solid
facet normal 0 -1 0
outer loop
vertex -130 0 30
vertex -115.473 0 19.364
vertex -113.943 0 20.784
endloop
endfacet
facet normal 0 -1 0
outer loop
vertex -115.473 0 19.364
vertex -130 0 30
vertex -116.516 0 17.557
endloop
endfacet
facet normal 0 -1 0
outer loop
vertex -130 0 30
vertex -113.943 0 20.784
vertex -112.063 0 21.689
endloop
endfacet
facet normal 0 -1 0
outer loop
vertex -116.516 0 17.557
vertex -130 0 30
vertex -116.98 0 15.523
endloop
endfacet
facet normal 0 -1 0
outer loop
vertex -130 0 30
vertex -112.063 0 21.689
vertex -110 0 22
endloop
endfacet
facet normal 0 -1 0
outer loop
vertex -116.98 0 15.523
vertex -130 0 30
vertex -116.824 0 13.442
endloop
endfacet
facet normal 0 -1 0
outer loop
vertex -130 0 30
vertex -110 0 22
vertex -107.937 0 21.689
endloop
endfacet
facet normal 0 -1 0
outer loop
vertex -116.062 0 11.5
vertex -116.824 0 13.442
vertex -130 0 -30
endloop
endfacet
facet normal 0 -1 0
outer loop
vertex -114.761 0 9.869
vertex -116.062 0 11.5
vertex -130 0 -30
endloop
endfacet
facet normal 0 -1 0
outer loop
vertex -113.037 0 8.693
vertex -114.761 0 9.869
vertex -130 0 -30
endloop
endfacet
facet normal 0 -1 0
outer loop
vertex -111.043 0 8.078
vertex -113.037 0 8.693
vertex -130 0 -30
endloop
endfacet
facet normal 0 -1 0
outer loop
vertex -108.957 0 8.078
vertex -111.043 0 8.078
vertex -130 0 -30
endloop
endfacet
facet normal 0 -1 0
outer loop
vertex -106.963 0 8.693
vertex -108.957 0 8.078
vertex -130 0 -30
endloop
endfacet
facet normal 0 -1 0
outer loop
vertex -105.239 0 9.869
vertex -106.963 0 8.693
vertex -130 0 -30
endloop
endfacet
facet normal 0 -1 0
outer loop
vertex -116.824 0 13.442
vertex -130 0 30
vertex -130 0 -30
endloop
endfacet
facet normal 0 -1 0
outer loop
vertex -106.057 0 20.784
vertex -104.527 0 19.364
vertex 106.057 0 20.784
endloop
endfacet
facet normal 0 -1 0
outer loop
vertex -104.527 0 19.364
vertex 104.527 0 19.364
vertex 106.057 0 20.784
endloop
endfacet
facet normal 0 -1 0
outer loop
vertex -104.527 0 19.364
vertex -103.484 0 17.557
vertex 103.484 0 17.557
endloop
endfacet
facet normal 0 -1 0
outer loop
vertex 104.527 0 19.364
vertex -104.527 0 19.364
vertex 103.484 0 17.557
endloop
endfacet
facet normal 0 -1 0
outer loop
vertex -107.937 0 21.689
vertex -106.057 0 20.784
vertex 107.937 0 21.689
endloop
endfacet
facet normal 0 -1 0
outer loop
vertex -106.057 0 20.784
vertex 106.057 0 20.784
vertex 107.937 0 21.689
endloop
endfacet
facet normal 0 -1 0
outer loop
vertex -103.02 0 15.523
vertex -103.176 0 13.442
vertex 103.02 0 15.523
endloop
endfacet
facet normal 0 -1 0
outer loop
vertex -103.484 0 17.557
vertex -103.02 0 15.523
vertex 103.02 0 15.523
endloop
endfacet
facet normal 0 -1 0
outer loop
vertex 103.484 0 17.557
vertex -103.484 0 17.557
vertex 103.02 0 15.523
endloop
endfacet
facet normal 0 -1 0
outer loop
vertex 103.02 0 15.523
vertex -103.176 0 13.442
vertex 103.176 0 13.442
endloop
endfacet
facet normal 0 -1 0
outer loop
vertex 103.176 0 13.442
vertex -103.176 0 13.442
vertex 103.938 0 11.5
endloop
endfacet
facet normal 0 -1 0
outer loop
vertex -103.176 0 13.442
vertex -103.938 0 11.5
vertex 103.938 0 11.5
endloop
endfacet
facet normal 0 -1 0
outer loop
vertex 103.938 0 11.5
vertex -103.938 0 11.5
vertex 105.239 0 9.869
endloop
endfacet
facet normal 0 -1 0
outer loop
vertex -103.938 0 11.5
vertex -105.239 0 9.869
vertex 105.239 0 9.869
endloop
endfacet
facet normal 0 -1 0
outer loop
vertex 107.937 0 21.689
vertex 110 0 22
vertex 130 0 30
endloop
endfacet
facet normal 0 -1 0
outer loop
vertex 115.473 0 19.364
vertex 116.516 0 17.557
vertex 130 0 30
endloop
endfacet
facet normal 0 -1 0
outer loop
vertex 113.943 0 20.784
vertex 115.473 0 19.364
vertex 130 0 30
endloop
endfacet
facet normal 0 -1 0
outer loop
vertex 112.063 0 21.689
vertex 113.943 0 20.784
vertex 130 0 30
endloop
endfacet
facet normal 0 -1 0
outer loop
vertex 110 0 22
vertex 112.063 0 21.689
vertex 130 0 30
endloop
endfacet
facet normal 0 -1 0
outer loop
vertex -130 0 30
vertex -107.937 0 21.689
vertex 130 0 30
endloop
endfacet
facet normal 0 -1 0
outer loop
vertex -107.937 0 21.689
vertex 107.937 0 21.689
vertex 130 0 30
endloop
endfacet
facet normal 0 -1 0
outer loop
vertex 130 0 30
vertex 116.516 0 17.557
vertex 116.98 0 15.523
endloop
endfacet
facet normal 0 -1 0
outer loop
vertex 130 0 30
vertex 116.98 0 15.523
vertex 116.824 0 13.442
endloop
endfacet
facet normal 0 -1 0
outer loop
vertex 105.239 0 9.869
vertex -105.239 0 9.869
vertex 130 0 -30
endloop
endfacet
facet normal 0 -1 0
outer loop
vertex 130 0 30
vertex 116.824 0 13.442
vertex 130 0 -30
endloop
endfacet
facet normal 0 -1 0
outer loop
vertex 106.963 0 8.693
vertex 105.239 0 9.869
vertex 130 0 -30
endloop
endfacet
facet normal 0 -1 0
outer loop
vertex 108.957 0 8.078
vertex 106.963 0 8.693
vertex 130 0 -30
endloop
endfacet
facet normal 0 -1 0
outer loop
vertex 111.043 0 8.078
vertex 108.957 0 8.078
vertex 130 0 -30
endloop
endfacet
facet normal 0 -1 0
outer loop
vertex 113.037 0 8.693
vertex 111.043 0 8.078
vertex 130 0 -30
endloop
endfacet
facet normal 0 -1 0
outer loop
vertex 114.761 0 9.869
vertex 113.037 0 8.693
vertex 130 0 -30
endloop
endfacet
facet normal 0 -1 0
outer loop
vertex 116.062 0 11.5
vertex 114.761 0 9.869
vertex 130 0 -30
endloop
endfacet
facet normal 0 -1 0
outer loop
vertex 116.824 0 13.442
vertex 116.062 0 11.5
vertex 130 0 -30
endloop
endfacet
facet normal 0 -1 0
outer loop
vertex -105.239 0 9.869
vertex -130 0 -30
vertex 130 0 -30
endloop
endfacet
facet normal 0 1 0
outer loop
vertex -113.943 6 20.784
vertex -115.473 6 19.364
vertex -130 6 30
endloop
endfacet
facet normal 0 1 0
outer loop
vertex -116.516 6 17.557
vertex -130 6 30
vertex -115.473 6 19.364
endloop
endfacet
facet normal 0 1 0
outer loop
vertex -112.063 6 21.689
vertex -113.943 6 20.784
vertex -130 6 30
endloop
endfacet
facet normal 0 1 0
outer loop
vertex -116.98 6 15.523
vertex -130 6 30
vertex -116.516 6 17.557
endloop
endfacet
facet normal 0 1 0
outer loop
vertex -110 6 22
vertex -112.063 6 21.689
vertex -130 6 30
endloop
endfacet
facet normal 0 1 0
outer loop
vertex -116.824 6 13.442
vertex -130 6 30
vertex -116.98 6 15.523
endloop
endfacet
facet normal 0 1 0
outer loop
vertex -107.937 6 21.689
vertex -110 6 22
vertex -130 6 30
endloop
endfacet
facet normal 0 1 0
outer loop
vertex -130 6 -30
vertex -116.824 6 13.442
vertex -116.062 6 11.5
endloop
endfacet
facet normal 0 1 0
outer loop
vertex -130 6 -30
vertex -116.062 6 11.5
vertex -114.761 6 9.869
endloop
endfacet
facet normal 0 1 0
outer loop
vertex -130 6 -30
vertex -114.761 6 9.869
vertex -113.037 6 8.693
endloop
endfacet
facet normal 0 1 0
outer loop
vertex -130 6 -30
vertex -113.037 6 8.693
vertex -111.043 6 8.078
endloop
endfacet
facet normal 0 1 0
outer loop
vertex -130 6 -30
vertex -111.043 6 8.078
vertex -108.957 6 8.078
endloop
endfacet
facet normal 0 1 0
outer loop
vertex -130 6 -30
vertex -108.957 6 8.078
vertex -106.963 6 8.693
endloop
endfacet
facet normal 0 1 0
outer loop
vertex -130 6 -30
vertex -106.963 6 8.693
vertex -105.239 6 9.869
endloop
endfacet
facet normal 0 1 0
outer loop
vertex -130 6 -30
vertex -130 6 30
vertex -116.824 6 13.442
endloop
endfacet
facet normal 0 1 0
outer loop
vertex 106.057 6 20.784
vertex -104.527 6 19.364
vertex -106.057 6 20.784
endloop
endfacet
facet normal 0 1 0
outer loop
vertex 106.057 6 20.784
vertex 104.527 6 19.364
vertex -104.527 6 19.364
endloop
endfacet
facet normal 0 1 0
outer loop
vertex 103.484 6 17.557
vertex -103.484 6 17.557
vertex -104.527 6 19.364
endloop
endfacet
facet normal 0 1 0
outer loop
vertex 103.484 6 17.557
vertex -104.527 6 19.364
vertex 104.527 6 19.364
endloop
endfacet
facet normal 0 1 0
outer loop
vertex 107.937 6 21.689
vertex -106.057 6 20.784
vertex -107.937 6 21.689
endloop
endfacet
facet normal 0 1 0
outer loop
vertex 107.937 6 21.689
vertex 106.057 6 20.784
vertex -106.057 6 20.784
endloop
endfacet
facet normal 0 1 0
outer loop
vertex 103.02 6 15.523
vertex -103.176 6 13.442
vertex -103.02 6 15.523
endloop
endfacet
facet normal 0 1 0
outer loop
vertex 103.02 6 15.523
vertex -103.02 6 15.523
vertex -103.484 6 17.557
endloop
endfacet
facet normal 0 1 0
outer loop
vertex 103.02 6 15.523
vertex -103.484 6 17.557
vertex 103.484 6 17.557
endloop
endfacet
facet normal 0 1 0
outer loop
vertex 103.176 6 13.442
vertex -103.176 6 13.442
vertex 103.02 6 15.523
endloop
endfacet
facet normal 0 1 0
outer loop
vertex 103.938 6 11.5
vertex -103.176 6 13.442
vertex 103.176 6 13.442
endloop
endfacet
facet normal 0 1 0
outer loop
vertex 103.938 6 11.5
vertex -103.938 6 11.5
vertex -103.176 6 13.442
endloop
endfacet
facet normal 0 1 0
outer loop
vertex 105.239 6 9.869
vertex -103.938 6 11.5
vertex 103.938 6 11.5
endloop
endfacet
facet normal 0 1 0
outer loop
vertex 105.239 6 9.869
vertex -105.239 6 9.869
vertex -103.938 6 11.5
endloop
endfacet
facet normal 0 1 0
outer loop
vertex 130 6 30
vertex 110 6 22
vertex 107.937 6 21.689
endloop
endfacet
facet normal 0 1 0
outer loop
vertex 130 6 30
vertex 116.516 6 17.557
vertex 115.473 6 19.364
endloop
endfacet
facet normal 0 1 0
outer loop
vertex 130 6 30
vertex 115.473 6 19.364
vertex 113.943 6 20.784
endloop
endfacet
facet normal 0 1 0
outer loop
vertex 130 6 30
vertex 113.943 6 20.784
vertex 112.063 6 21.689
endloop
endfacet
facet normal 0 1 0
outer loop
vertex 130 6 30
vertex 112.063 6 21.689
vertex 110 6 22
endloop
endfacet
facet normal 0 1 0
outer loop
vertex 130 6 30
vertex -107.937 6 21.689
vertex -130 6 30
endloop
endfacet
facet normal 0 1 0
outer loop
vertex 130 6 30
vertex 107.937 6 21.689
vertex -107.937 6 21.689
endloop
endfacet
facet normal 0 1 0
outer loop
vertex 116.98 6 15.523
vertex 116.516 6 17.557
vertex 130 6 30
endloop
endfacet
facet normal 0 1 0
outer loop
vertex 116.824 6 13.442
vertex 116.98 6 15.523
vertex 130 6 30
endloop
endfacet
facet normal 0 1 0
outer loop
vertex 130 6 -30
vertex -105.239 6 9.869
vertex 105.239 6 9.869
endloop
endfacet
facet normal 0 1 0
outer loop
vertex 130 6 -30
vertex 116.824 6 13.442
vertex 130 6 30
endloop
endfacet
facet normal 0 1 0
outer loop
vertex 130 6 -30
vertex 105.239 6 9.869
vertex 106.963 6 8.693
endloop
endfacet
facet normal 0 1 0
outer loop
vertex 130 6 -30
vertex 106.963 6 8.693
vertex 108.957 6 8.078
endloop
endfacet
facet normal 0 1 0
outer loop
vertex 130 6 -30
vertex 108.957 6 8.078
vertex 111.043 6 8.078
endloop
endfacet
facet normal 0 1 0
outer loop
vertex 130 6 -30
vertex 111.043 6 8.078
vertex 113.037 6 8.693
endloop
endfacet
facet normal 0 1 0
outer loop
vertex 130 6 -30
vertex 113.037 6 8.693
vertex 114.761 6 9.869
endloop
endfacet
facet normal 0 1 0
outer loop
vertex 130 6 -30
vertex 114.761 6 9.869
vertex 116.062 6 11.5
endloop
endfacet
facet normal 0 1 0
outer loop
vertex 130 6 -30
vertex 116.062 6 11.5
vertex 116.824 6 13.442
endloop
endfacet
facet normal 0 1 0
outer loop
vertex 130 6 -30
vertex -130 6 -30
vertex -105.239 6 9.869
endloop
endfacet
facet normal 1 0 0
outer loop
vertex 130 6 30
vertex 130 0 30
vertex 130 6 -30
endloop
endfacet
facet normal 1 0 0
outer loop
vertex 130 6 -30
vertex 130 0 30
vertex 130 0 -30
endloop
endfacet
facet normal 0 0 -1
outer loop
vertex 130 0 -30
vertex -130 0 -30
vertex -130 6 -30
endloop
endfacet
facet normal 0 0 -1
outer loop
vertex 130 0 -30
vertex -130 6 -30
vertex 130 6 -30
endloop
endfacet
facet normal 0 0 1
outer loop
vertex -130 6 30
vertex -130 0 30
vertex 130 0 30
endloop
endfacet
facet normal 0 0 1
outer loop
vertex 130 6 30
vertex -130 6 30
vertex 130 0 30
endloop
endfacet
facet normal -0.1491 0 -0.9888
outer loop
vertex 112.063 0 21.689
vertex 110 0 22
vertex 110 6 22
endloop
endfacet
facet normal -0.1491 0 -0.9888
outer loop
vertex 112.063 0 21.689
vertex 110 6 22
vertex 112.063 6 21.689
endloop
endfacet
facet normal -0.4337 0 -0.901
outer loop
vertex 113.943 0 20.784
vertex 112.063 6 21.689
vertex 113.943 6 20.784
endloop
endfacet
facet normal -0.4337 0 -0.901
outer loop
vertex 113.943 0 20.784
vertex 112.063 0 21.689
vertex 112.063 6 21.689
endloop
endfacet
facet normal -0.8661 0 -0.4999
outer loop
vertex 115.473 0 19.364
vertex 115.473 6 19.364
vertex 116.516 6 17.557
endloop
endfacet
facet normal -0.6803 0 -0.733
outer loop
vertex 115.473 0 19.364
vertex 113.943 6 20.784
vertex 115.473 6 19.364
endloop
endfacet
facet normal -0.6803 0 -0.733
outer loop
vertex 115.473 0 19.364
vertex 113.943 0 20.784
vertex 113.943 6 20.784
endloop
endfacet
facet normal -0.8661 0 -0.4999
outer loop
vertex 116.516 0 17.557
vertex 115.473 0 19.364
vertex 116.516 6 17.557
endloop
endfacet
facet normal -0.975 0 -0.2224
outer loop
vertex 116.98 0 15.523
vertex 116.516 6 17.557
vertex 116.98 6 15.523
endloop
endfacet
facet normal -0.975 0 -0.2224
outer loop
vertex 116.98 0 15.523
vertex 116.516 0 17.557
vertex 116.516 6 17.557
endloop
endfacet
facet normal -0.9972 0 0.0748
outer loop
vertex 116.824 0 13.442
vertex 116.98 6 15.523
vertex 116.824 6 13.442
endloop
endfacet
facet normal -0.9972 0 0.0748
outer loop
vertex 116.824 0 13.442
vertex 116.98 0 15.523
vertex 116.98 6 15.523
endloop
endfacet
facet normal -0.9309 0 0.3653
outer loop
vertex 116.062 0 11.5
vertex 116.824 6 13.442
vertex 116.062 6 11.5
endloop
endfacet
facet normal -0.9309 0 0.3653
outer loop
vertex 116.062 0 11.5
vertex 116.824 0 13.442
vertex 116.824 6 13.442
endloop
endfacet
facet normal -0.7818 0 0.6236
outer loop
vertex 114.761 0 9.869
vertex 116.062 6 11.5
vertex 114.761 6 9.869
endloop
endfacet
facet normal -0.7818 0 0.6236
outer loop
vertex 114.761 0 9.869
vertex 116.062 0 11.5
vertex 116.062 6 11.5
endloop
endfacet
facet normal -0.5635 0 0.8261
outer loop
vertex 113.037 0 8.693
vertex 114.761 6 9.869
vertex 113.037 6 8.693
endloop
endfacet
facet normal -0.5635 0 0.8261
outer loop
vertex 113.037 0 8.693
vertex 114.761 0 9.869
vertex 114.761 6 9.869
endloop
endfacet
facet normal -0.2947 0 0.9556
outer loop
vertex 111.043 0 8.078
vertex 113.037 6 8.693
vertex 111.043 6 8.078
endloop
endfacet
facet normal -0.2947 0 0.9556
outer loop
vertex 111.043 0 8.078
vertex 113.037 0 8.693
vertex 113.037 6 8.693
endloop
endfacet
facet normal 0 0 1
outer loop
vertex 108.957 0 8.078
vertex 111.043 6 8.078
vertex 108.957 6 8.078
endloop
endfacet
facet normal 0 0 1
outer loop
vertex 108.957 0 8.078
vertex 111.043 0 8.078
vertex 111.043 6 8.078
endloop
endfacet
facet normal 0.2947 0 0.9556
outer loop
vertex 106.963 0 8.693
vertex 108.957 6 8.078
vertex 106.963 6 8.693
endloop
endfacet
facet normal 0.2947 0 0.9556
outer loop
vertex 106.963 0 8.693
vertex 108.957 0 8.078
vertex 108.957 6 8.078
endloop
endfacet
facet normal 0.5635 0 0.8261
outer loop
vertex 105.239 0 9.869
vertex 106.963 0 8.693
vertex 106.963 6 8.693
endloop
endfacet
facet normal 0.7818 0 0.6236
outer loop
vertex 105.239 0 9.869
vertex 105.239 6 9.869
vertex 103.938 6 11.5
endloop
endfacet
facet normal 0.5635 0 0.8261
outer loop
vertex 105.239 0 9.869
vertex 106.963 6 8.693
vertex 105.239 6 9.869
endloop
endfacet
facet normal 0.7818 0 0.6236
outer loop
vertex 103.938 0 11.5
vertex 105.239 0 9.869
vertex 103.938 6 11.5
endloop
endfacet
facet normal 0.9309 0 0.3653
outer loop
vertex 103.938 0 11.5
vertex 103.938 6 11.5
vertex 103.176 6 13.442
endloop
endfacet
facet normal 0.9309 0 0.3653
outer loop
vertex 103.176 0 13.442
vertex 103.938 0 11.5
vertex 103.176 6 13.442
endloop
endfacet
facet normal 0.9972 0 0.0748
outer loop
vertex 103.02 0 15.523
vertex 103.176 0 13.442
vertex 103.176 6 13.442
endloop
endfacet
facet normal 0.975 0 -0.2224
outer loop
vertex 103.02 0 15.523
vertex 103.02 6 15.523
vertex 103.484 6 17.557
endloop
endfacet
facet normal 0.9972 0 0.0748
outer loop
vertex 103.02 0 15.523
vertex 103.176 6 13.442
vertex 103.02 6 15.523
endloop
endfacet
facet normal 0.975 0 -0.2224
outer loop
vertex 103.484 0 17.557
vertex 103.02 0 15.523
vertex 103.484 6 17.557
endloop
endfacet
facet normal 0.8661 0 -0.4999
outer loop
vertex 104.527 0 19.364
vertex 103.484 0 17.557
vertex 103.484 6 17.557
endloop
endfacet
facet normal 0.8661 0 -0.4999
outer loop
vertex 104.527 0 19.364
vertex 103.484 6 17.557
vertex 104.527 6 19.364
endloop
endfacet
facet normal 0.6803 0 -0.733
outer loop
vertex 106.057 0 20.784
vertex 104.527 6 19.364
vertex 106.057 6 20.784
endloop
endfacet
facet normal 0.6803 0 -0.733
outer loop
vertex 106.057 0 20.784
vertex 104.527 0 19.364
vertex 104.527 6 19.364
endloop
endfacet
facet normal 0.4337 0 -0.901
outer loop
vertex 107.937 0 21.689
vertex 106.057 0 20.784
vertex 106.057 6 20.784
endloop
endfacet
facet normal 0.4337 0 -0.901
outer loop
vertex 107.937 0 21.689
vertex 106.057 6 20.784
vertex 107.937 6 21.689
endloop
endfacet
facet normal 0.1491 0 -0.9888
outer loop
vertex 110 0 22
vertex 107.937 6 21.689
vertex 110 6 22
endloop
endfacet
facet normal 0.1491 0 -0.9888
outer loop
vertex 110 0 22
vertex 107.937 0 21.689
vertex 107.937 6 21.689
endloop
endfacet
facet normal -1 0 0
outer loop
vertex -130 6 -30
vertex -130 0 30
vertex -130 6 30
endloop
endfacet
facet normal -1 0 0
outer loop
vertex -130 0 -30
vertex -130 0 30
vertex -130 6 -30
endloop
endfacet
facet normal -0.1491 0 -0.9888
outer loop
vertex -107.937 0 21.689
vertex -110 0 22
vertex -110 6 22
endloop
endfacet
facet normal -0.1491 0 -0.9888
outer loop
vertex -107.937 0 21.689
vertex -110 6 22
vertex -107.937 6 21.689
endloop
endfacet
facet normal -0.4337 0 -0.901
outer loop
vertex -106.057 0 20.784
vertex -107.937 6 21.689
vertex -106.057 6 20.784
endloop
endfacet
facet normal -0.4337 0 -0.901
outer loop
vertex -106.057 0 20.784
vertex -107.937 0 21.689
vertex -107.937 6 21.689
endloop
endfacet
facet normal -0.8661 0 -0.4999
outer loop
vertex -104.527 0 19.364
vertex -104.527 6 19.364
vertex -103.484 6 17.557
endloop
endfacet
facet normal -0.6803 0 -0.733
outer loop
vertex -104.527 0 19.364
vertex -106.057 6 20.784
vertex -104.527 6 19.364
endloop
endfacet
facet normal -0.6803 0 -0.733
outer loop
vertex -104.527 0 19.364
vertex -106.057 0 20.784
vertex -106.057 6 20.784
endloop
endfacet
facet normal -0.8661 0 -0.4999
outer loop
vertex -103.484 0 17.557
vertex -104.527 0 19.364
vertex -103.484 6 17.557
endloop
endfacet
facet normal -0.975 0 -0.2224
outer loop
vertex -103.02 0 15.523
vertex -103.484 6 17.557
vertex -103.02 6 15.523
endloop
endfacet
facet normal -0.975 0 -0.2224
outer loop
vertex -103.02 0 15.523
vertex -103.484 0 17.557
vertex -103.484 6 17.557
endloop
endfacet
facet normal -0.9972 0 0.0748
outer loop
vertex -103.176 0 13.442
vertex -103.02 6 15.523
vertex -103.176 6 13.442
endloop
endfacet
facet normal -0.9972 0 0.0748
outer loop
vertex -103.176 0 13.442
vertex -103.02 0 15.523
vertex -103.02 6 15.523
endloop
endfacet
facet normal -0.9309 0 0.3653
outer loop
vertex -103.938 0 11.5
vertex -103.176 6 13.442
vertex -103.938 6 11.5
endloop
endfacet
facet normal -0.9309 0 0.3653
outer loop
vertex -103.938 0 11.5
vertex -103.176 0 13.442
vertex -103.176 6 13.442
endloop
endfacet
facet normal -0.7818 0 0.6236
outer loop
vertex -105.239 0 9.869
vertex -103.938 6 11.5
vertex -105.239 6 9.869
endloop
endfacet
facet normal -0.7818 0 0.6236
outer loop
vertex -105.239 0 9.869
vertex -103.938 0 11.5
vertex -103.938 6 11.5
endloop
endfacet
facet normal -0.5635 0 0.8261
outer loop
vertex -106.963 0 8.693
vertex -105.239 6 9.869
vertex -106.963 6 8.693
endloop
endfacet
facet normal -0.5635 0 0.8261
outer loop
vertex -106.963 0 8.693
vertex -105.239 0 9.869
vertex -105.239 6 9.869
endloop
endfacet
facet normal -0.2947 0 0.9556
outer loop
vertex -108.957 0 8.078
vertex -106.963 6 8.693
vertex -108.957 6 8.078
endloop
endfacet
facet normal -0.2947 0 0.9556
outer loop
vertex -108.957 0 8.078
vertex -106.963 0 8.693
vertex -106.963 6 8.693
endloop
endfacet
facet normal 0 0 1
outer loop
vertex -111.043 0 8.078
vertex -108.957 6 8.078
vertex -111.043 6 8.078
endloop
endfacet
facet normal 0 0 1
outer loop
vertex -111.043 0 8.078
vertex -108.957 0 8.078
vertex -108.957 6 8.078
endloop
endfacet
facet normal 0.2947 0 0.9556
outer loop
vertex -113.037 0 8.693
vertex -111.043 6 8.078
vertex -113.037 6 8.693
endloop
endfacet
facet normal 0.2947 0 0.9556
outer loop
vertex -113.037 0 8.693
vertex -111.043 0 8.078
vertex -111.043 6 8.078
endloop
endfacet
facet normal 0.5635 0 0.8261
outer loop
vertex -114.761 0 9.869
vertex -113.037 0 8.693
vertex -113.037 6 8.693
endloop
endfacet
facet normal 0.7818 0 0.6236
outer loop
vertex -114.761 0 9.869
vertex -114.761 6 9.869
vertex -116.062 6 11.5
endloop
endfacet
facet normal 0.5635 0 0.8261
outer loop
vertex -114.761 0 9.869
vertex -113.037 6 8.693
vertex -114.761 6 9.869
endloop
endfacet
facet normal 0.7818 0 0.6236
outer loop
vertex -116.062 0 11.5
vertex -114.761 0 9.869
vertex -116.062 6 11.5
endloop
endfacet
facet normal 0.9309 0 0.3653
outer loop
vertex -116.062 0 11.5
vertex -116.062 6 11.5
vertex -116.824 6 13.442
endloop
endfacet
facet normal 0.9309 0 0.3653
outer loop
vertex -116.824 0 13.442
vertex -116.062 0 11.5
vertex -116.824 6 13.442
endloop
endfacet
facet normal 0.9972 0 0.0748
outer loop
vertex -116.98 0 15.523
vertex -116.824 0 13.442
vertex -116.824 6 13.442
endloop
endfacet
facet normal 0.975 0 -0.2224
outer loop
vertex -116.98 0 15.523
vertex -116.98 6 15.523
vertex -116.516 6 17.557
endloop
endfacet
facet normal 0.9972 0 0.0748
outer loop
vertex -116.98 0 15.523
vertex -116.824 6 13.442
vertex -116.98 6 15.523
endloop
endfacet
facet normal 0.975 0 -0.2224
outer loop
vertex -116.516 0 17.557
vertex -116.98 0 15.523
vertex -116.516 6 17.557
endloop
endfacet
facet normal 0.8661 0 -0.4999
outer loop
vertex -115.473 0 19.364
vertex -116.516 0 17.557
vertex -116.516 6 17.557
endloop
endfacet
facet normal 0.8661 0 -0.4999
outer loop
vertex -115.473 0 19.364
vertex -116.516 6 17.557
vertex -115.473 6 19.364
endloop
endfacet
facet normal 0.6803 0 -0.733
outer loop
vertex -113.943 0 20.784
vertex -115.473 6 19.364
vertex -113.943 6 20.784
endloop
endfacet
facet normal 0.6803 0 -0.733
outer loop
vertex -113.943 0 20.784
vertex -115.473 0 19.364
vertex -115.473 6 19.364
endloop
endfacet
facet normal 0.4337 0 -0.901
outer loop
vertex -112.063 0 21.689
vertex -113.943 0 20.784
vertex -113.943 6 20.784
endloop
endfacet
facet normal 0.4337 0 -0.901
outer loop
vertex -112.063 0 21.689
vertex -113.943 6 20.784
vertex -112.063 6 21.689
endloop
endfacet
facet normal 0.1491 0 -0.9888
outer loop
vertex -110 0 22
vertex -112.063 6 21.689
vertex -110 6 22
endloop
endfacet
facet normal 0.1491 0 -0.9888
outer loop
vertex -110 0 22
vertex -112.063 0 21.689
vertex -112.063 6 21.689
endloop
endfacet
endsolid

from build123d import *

# Parameters (mm, degrees)
SKETCH1_W               = 260
SKETCH1_H               = 60
BOSS_EXTRUDE1_DEPTH     = 6
CUT_EXTRUDE1_DEPTH      = 134.551488198
CUT_EXTRUDE1_DEPTH_BACK = 134.551488198
SKETCH2_R               = 7


with BuildPart() as part:
    # Sketch1 → Boss-Extrude1 (new body)
    with BuildSketch(Plane(origin=(0, 0, 0), x_dir=(1, 0, 0), z_dir=(0, 1, 0))):
        Rectangle(SKETCH1_W, SKETCH1_H)
    extrude(amount=BOSS_EXTRUDE1_DEPTH)

    # Sketch2 → Cut-Extrude1 (cut, two sides: drawn at the far end of the back side and taken through both)
    with BuildSketch(Plane(origin=(0, 6, 0), x_dir=(1, 0, 0), z_dir=(0, 1, 0)).offset(-CUT_EXTRUDE1_DEPTH_BACK)):
        with Locations(Location((110, -15, 0), (0, 0, 270))):
            Circle(SKETCH2_R)
        with Locations(Location((-110, -15, 0), (0, 0, 270))):
            Circle(SKETCH2_R)
    extrude(amount=CUT_EXTRUDE1_DEPTH + CUT_EXTRUDE1_DEPTH_BACK, mode=Mode.SUBTRACT)


solid = part.part
